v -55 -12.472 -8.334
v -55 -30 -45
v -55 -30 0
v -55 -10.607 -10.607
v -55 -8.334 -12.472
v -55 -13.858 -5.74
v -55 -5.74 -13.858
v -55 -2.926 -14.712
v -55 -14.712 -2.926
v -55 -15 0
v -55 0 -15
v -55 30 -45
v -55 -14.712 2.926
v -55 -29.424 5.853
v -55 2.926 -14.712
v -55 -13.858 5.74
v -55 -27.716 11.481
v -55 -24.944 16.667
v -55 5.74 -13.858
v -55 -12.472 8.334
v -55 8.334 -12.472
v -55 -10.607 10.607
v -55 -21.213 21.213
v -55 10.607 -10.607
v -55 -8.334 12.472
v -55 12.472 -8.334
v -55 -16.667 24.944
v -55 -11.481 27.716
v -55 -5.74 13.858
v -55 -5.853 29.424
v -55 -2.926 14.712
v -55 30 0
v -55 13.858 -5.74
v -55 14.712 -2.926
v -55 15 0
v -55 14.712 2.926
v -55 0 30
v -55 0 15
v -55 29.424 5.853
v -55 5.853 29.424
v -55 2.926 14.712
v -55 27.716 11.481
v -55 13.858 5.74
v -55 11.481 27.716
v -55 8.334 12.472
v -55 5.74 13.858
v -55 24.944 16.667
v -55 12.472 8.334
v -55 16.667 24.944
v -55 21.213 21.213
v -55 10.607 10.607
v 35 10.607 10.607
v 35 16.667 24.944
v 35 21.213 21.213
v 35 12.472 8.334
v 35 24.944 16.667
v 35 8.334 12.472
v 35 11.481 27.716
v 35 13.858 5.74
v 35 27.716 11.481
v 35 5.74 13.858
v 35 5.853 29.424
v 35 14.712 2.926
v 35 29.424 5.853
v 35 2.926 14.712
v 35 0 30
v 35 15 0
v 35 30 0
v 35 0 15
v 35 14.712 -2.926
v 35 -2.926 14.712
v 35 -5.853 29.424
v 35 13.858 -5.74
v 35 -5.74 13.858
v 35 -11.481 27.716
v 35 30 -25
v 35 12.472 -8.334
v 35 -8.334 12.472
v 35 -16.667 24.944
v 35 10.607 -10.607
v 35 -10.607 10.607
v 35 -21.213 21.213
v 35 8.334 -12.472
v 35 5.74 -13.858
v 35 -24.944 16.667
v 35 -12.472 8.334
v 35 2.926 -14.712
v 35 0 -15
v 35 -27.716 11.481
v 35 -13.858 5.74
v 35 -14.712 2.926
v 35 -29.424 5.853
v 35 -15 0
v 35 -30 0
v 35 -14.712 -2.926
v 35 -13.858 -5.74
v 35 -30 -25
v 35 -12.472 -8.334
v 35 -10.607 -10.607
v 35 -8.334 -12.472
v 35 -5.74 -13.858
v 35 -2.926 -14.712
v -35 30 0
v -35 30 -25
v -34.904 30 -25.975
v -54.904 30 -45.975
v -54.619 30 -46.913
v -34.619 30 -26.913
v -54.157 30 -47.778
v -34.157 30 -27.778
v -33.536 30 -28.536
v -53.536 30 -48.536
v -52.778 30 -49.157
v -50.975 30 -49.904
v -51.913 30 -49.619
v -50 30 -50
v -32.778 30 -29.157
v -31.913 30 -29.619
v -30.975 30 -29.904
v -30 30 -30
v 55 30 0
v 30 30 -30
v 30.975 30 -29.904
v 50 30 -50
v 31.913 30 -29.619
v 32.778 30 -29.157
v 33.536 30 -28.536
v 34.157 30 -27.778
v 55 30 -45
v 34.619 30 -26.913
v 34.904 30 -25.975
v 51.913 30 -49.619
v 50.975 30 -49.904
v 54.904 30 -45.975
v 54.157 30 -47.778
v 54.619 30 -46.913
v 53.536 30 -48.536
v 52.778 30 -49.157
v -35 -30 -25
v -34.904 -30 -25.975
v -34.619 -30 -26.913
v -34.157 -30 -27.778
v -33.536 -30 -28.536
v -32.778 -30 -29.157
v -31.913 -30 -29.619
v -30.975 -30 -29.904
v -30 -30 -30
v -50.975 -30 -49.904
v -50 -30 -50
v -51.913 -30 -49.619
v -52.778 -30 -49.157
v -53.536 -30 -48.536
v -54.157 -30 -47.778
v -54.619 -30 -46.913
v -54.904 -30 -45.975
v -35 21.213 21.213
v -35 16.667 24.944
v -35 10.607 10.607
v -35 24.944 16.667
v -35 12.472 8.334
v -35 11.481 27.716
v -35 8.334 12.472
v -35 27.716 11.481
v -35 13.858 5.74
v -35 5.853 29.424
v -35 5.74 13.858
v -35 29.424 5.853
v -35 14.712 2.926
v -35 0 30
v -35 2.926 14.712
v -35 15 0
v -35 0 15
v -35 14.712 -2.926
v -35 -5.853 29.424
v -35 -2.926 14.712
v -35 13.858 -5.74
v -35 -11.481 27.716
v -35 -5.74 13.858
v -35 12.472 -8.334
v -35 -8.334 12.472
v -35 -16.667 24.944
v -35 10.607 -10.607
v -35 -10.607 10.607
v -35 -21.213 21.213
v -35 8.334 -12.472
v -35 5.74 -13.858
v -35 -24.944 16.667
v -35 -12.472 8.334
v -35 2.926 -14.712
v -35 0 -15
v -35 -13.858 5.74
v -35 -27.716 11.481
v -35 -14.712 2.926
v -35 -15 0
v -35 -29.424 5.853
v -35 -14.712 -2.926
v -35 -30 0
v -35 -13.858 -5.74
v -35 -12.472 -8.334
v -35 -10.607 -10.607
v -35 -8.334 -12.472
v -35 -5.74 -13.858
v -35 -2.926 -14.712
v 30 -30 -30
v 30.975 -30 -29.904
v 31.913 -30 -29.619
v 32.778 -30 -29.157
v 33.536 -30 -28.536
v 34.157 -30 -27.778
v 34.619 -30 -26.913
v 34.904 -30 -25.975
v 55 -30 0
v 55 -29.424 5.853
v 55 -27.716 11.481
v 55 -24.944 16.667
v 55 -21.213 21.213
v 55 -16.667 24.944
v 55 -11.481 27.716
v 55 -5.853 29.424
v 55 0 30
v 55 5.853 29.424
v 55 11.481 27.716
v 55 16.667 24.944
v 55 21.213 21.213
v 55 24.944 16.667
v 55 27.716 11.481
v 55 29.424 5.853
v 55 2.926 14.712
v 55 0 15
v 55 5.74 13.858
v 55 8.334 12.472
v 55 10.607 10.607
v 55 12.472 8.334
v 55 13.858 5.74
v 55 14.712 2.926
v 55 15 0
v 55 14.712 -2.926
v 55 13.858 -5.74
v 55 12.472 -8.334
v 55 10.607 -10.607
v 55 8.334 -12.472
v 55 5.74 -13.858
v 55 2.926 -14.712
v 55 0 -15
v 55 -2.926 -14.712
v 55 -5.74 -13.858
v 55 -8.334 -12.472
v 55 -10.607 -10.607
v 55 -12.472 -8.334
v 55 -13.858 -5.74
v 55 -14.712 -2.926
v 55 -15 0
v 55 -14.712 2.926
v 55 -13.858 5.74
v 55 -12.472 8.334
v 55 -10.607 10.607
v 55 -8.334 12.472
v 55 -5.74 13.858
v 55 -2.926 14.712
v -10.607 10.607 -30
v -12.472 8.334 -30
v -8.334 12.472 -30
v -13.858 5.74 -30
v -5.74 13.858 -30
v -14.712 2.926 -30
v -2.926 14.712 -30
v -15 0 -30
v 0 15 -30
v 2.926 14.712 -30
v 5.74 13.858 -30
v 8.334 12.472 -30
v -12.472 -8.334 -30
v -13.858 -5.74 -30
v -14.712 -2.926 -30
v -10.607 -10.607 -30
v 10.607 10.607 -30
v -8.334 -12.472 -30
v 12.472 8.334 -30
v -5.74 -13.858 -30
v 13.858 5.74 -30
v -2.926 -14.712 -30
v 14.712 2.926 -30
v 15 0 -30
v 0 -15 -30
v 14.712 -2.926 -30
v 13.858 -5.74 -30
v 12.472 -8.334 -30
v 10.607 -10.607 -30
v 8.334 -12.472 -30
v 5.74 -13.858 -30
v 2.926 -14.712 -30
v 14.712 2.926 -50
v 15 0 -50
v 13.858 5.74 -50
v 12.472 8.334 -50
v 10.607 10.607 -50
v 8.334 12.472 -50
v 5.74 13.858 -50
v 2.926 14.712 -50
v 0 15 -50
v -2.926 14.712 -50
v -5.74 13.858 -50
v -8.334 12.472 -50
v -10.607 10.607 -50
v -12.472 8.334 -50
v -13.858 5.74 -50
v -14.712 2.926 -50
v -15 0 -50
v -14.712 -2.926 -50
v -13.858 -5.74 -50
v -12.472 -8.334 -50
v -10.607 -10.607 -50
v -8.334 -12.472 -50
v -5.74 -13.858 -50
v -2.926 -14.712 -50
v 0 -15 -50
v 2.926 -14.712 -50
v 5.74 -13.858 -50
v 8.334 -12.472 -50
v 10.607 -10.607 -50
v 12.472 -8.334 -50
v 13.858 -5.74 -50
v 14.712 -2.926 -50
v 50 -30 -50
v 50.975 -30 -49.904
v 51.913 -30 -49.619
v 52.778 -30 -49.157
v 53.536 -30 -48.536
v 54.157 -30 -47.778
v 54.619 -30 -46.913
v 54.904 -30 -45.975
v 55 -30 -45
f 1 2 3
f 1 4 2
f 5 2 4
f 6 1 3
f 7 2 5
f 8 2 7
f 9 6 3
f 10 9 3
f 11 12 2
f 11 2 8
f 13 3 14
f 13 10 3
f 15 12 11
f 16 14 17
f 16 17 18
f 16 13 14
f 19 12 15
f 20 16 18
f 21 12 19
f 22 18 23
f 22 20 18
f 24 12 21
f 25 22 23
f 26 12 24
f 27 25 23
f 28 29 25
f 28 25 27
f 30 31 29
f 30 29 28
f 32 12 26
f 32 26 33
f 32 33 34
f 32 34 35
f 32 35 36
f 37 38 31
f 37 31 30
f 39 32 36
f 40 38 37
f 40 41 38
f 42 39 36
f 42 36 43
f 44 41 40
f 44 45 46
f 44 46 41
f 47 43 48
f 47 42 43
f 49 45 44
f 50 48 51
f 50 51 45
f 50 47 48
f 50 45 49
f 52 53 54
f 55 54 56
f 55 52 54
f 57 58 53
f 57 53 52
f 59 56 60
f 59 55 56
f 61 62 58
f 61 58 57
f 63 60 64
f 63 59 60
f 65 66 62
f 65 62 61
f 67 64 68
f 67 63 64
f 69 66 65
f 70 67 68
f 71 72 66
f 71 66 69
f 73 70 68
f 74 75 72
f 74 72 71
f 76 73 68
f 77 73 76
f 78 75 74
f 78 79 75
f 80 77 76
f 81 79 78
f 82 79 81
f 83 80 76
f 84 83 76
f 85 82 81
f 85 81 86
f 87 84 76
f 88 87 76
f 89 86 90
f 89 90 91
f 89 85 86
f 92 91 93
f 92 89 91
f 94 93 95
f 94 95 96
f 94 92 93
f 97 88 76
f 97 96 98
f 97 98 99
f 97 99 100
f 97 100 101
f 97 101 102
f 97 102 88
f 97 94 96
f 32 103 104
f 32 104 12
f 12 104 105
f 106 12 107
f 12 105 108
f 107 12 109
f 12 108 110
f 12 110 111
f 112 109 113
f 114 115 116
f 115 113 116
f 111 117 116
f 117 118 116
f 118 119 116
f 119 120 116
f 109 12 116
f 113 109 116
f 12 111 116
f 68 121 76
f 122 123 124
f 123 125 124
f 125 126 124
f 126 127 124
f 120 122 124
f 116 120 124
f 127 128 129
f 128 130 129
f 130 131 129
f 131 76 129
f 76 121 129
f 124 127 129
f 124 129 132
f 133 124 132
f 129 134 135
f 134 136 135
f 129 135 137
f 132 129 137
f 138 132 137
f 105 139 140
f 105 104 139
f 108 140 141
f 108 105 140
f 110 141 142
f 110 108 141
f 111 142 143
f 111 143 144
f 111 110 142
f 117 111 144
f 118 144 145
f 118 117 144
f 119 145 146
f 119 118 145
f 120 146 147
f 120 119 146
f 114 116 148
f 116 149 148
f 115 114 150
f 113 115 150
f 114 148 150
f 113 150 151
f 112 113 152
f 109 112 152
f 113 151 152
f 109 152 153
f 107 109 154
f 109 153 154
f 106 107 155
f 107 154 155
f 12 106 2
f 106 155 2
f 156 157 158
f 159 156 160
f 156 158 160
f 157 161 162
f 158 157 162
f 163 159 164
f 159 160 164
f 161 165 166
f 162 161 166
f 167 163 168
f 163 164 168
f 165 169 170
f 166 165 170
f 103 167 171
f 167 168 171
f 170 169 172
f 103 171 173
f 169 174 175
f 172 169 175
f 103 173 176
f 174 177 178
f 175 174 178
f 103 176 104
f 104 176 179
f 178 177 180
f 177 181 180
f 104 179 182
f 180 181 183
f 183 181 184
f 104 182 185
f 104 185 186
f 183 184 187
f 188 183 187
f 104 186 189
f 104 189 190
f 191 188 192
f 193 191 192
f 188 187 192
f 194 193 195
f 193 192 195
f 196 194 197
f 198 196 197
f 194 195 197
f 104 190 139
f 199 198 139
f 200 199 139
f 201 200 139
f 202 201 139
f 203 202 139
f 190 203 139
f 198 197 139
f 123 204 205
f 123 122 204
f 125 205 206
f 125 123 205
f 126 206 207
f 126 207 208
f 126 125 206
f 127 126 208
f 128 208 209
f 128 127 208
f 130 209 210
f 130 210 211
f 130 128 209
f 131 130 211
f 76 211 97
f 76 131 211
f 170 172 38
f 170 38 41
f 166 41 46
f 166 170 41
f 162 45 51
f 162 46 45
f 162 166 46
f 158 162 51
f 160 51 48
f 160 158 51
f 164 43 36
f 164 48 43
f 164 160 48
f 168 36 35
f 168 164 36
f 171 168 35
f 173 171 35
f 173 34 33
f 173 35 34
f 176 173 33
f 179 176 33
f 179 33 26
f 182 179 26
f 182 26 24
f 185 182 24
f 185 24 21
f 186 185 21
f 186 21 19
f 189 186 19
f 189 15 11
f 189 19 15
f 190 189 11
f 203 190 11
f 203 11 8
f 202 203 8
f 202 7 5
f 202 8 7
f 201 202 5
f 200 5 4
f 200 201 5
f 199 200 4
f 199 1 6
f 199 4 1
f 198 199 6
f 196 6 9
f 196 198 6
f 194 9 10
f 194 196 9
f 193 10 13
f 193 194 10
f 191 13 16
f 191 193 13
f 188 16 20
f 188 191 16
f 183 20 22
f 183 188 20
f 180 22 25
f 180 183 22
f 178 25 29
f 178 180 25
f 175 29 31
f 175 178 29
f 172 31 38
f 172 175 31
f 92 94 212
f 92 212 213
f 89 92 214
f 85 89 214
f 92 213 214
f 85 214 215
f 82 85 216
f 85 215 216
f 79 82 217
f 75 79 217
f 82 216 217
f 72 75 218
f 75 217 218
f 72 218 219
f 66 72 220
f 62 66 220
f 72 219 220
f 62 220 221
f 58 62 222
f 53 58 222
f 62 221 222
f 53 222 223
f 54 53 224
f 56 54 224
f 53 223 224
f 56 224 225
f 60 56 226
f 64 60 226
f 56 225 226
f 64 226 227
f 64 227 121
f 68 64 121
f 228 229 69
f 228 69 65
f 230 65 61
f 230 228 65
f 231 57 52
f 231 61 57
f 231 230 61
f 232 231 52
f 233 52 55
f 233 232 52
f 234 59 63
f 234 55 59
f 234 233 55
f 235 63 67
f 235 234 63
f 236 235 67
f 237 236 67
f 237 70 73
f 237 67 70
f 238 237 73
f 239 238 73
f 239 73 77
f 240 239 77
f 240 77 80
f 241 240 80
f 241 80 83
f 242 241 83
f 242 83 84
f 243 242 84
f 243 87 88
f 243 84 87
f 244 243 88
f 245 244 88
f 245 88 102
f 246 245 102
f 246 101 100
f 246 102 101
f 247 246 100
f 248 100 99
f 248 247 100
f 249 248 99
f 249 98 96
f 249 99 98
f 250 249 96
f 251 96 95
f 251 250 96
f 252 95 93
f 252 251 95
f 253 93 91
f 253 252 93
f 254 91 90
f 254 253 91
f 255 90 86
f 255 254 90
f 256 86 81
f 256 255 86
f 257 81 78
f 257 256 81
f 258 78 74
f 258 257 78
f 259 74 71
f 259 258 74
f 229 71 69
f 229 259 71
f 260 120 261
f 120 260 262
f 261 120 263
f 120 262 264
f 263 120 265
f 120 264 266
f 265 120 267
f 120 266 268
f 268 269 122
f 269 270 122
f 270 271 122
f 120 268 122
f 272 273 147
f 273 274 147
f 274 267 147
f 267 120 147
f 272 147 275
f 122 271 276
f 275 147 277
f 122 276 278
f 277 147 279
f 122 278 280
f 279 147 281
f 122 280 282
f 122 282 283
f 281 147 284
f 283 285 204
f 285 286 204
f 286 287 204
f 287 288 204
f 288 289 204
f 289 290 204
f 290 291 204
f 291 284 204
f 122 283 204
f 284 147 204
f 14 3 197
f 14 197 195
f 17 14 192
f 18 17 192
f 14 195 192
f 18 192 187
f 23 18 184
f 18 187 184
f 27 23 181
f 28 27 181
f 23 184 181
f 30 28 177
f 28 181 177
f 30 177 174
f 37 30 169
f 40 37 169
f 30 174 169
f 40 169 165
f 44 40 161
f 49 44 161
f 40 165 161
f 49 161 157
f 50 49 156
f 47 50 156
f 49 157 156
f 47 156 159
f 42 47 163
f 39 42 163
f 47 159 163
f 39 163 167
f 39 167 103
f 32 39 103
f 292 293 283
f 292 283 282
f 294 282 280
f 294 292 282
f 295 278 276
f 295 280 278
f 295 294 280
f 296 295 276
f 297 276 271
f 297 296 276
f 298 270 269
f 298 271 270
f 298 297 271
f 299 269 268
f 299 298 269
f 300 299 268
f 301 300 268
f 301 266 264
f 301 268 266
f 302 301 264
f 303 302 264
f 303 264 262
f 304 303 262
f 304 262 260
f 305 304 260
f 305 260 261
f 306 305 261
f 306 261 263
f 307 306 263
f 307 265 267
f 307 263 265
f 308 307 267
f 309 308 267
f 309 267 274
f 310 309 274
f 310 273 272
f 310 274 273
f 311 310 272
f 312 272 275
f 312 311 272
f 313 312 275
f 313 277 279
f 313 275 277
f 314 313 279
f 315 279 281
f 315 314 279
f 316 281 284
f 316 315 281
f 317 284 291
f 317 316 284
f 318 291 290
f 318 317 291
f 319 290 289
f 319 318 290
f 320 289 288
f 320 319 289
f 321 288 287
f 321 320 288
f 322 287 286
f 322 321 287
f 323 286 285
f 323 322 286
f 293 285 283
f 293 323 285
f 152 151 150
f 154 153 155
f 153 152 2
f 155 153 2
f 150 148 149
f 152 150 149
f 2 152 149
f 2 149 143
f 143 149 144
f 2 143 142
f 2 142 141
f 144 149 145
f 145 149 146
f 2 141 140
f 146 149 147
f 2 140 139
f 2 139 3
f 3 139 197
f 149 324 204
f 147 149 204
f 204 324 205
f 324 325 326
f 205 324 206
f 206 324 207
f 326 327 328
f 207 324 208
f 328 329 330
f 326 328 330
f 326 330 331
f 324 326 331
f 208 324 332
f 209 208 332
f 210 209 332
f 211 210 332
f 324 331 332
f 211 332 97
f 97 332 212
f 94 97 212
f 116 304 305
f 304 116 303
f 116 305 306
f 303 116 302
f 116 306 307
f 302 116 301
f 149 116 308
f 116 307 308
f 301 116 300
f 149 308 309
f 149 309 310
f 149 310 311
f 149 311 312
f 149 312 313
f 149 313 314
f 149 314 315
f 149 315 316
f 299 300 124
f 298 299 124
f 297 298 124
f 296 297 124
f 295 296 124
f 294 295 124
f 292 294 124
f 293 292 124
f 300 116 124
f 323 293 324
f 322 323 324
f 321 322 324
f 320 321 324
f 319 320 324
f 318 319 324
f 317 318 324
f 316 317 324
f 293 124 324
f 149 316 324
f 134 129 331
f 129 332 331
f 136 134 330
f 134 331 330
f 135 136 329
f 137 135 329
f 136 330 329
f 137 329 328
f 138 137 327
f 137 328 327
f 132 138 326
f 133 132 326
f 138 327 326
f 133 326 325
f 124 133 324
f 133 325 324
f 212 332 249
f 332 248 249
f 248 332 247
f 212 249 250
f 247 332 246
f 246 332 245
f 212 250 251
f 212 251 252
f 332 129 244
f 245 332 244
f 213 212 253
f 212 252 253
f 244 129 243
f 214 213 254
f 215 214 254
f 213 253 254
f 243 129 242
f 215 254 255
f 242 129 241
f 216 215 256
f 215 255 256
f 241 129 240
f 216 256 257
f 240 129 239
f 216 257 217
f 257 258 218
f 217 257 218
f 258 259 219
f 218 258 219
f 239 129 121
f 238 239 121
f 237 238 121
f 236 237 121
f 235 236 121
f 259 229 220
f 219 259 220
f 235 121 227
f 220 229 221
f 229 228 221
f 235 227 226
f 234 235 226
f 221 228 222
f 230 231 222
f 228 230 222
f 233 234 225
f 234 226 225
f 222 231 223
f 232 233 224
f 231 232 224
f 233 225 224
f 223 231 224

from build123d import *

# Parameters (mm, degrees)
BOSS_EXTRUDE1_DEPTH     = 55
CUT_EXTRUDE1_DEPTH      = 81.156097709
CUT_EXTRUDE1_DEPTH_BACK = 81.156097709
SKETCH2_W               = 70
SKETCH2_H               = 60
CUT_EXTRUDE4_DEPTH      = 125.49899598
CUT_EXTRUDE4_DEPTH_BACK = 125.49899598
SKETCH5_R               = 15
FILLET1_R               = 5
CUT_EXTRUDE5_DEPTH      = 87.746757864
CUT_EXTRUDE5_DEPTH_BACK = 87.746757864
SKETCH6_R               = 15


with BuildPart() as part:
    # Sketch1 → Boss-Extrude1 (new, symmetric)
    with BuildSketch(Plane(origin=(0, 0, 0), x_dir=(0, 0, -1), z_dir=(1, 0, 0))):
        with BuildLine():
            Line((0, 30), (50, 30))
            Line((50, 30), (50, -30))
            Line((50, -30), (0, -30))
            ThreePointArc((0, -30), (-30, 0), (0, 30))
        make_face()
    extrude(amount=BOSS_EXTRUDE1_DEPTH, both=True)

    # Sketch2 → Cut-Extrude1 (cut, two sides: drawn at the far end of the back side and taken through both)
    with BuildSketch(Plane(origin=(0, 0, 0), x_dir=(1, 0, 0), z_dir=(0, 1, 0)).offset(-CUT_EXTRUDE1_DEPTH_BACK)):
        Rectangle(SKETCH2_W, SKETCH2_H)
    extrude(amount=CUT_EXTRUDE1_DEPTH + CUT_EXTRUDE1_DEPTH_BACK, mode=Mode.SUBTRACT)

    # Sketch5 → Cut-Extrude4 (cut, two sides: drawn at the far end of the back side and taken through both)
    with BuildSketch(Plane.ZY.offset(55).offset(-CUT_EXTRUDE4_DEPTH_BACK)):
        Circle(SKETCH5_R)
    extrude(amount=CUT_EXTRUDE4_DEPTH + CUT_EXTRUDE4_DEPTH_BACK, mode=Mode.SUBTRACT)

    # Fillet1
    fillet1_edges = [part.edges().sort_by_distance(p)[0] for p in [
        (55, 0, -50),
        (35, 0, -30),
        (-35, 0, -30),
        (-55, 0, -50),
    ]]
    fillet(fillet1_edges, radius=FILLET1_R)

    # Sketch6 → Cut-Extrude5 (cut, two sides: drawn at the far end of the back side and taken through both)
    with BuildSketch(Plane.XY.offset(-30).offset(-CUT_EXTRUDE5_DEPTH_BACK)):
        Circle(SKETCH6_R)
    extrude(amount=CUT_EXTRUDE5_DEPTH + CUT_EXTRUDE5_DEPTH_BACK, mode=Mode.SUBTRACT)


solid = part.part
